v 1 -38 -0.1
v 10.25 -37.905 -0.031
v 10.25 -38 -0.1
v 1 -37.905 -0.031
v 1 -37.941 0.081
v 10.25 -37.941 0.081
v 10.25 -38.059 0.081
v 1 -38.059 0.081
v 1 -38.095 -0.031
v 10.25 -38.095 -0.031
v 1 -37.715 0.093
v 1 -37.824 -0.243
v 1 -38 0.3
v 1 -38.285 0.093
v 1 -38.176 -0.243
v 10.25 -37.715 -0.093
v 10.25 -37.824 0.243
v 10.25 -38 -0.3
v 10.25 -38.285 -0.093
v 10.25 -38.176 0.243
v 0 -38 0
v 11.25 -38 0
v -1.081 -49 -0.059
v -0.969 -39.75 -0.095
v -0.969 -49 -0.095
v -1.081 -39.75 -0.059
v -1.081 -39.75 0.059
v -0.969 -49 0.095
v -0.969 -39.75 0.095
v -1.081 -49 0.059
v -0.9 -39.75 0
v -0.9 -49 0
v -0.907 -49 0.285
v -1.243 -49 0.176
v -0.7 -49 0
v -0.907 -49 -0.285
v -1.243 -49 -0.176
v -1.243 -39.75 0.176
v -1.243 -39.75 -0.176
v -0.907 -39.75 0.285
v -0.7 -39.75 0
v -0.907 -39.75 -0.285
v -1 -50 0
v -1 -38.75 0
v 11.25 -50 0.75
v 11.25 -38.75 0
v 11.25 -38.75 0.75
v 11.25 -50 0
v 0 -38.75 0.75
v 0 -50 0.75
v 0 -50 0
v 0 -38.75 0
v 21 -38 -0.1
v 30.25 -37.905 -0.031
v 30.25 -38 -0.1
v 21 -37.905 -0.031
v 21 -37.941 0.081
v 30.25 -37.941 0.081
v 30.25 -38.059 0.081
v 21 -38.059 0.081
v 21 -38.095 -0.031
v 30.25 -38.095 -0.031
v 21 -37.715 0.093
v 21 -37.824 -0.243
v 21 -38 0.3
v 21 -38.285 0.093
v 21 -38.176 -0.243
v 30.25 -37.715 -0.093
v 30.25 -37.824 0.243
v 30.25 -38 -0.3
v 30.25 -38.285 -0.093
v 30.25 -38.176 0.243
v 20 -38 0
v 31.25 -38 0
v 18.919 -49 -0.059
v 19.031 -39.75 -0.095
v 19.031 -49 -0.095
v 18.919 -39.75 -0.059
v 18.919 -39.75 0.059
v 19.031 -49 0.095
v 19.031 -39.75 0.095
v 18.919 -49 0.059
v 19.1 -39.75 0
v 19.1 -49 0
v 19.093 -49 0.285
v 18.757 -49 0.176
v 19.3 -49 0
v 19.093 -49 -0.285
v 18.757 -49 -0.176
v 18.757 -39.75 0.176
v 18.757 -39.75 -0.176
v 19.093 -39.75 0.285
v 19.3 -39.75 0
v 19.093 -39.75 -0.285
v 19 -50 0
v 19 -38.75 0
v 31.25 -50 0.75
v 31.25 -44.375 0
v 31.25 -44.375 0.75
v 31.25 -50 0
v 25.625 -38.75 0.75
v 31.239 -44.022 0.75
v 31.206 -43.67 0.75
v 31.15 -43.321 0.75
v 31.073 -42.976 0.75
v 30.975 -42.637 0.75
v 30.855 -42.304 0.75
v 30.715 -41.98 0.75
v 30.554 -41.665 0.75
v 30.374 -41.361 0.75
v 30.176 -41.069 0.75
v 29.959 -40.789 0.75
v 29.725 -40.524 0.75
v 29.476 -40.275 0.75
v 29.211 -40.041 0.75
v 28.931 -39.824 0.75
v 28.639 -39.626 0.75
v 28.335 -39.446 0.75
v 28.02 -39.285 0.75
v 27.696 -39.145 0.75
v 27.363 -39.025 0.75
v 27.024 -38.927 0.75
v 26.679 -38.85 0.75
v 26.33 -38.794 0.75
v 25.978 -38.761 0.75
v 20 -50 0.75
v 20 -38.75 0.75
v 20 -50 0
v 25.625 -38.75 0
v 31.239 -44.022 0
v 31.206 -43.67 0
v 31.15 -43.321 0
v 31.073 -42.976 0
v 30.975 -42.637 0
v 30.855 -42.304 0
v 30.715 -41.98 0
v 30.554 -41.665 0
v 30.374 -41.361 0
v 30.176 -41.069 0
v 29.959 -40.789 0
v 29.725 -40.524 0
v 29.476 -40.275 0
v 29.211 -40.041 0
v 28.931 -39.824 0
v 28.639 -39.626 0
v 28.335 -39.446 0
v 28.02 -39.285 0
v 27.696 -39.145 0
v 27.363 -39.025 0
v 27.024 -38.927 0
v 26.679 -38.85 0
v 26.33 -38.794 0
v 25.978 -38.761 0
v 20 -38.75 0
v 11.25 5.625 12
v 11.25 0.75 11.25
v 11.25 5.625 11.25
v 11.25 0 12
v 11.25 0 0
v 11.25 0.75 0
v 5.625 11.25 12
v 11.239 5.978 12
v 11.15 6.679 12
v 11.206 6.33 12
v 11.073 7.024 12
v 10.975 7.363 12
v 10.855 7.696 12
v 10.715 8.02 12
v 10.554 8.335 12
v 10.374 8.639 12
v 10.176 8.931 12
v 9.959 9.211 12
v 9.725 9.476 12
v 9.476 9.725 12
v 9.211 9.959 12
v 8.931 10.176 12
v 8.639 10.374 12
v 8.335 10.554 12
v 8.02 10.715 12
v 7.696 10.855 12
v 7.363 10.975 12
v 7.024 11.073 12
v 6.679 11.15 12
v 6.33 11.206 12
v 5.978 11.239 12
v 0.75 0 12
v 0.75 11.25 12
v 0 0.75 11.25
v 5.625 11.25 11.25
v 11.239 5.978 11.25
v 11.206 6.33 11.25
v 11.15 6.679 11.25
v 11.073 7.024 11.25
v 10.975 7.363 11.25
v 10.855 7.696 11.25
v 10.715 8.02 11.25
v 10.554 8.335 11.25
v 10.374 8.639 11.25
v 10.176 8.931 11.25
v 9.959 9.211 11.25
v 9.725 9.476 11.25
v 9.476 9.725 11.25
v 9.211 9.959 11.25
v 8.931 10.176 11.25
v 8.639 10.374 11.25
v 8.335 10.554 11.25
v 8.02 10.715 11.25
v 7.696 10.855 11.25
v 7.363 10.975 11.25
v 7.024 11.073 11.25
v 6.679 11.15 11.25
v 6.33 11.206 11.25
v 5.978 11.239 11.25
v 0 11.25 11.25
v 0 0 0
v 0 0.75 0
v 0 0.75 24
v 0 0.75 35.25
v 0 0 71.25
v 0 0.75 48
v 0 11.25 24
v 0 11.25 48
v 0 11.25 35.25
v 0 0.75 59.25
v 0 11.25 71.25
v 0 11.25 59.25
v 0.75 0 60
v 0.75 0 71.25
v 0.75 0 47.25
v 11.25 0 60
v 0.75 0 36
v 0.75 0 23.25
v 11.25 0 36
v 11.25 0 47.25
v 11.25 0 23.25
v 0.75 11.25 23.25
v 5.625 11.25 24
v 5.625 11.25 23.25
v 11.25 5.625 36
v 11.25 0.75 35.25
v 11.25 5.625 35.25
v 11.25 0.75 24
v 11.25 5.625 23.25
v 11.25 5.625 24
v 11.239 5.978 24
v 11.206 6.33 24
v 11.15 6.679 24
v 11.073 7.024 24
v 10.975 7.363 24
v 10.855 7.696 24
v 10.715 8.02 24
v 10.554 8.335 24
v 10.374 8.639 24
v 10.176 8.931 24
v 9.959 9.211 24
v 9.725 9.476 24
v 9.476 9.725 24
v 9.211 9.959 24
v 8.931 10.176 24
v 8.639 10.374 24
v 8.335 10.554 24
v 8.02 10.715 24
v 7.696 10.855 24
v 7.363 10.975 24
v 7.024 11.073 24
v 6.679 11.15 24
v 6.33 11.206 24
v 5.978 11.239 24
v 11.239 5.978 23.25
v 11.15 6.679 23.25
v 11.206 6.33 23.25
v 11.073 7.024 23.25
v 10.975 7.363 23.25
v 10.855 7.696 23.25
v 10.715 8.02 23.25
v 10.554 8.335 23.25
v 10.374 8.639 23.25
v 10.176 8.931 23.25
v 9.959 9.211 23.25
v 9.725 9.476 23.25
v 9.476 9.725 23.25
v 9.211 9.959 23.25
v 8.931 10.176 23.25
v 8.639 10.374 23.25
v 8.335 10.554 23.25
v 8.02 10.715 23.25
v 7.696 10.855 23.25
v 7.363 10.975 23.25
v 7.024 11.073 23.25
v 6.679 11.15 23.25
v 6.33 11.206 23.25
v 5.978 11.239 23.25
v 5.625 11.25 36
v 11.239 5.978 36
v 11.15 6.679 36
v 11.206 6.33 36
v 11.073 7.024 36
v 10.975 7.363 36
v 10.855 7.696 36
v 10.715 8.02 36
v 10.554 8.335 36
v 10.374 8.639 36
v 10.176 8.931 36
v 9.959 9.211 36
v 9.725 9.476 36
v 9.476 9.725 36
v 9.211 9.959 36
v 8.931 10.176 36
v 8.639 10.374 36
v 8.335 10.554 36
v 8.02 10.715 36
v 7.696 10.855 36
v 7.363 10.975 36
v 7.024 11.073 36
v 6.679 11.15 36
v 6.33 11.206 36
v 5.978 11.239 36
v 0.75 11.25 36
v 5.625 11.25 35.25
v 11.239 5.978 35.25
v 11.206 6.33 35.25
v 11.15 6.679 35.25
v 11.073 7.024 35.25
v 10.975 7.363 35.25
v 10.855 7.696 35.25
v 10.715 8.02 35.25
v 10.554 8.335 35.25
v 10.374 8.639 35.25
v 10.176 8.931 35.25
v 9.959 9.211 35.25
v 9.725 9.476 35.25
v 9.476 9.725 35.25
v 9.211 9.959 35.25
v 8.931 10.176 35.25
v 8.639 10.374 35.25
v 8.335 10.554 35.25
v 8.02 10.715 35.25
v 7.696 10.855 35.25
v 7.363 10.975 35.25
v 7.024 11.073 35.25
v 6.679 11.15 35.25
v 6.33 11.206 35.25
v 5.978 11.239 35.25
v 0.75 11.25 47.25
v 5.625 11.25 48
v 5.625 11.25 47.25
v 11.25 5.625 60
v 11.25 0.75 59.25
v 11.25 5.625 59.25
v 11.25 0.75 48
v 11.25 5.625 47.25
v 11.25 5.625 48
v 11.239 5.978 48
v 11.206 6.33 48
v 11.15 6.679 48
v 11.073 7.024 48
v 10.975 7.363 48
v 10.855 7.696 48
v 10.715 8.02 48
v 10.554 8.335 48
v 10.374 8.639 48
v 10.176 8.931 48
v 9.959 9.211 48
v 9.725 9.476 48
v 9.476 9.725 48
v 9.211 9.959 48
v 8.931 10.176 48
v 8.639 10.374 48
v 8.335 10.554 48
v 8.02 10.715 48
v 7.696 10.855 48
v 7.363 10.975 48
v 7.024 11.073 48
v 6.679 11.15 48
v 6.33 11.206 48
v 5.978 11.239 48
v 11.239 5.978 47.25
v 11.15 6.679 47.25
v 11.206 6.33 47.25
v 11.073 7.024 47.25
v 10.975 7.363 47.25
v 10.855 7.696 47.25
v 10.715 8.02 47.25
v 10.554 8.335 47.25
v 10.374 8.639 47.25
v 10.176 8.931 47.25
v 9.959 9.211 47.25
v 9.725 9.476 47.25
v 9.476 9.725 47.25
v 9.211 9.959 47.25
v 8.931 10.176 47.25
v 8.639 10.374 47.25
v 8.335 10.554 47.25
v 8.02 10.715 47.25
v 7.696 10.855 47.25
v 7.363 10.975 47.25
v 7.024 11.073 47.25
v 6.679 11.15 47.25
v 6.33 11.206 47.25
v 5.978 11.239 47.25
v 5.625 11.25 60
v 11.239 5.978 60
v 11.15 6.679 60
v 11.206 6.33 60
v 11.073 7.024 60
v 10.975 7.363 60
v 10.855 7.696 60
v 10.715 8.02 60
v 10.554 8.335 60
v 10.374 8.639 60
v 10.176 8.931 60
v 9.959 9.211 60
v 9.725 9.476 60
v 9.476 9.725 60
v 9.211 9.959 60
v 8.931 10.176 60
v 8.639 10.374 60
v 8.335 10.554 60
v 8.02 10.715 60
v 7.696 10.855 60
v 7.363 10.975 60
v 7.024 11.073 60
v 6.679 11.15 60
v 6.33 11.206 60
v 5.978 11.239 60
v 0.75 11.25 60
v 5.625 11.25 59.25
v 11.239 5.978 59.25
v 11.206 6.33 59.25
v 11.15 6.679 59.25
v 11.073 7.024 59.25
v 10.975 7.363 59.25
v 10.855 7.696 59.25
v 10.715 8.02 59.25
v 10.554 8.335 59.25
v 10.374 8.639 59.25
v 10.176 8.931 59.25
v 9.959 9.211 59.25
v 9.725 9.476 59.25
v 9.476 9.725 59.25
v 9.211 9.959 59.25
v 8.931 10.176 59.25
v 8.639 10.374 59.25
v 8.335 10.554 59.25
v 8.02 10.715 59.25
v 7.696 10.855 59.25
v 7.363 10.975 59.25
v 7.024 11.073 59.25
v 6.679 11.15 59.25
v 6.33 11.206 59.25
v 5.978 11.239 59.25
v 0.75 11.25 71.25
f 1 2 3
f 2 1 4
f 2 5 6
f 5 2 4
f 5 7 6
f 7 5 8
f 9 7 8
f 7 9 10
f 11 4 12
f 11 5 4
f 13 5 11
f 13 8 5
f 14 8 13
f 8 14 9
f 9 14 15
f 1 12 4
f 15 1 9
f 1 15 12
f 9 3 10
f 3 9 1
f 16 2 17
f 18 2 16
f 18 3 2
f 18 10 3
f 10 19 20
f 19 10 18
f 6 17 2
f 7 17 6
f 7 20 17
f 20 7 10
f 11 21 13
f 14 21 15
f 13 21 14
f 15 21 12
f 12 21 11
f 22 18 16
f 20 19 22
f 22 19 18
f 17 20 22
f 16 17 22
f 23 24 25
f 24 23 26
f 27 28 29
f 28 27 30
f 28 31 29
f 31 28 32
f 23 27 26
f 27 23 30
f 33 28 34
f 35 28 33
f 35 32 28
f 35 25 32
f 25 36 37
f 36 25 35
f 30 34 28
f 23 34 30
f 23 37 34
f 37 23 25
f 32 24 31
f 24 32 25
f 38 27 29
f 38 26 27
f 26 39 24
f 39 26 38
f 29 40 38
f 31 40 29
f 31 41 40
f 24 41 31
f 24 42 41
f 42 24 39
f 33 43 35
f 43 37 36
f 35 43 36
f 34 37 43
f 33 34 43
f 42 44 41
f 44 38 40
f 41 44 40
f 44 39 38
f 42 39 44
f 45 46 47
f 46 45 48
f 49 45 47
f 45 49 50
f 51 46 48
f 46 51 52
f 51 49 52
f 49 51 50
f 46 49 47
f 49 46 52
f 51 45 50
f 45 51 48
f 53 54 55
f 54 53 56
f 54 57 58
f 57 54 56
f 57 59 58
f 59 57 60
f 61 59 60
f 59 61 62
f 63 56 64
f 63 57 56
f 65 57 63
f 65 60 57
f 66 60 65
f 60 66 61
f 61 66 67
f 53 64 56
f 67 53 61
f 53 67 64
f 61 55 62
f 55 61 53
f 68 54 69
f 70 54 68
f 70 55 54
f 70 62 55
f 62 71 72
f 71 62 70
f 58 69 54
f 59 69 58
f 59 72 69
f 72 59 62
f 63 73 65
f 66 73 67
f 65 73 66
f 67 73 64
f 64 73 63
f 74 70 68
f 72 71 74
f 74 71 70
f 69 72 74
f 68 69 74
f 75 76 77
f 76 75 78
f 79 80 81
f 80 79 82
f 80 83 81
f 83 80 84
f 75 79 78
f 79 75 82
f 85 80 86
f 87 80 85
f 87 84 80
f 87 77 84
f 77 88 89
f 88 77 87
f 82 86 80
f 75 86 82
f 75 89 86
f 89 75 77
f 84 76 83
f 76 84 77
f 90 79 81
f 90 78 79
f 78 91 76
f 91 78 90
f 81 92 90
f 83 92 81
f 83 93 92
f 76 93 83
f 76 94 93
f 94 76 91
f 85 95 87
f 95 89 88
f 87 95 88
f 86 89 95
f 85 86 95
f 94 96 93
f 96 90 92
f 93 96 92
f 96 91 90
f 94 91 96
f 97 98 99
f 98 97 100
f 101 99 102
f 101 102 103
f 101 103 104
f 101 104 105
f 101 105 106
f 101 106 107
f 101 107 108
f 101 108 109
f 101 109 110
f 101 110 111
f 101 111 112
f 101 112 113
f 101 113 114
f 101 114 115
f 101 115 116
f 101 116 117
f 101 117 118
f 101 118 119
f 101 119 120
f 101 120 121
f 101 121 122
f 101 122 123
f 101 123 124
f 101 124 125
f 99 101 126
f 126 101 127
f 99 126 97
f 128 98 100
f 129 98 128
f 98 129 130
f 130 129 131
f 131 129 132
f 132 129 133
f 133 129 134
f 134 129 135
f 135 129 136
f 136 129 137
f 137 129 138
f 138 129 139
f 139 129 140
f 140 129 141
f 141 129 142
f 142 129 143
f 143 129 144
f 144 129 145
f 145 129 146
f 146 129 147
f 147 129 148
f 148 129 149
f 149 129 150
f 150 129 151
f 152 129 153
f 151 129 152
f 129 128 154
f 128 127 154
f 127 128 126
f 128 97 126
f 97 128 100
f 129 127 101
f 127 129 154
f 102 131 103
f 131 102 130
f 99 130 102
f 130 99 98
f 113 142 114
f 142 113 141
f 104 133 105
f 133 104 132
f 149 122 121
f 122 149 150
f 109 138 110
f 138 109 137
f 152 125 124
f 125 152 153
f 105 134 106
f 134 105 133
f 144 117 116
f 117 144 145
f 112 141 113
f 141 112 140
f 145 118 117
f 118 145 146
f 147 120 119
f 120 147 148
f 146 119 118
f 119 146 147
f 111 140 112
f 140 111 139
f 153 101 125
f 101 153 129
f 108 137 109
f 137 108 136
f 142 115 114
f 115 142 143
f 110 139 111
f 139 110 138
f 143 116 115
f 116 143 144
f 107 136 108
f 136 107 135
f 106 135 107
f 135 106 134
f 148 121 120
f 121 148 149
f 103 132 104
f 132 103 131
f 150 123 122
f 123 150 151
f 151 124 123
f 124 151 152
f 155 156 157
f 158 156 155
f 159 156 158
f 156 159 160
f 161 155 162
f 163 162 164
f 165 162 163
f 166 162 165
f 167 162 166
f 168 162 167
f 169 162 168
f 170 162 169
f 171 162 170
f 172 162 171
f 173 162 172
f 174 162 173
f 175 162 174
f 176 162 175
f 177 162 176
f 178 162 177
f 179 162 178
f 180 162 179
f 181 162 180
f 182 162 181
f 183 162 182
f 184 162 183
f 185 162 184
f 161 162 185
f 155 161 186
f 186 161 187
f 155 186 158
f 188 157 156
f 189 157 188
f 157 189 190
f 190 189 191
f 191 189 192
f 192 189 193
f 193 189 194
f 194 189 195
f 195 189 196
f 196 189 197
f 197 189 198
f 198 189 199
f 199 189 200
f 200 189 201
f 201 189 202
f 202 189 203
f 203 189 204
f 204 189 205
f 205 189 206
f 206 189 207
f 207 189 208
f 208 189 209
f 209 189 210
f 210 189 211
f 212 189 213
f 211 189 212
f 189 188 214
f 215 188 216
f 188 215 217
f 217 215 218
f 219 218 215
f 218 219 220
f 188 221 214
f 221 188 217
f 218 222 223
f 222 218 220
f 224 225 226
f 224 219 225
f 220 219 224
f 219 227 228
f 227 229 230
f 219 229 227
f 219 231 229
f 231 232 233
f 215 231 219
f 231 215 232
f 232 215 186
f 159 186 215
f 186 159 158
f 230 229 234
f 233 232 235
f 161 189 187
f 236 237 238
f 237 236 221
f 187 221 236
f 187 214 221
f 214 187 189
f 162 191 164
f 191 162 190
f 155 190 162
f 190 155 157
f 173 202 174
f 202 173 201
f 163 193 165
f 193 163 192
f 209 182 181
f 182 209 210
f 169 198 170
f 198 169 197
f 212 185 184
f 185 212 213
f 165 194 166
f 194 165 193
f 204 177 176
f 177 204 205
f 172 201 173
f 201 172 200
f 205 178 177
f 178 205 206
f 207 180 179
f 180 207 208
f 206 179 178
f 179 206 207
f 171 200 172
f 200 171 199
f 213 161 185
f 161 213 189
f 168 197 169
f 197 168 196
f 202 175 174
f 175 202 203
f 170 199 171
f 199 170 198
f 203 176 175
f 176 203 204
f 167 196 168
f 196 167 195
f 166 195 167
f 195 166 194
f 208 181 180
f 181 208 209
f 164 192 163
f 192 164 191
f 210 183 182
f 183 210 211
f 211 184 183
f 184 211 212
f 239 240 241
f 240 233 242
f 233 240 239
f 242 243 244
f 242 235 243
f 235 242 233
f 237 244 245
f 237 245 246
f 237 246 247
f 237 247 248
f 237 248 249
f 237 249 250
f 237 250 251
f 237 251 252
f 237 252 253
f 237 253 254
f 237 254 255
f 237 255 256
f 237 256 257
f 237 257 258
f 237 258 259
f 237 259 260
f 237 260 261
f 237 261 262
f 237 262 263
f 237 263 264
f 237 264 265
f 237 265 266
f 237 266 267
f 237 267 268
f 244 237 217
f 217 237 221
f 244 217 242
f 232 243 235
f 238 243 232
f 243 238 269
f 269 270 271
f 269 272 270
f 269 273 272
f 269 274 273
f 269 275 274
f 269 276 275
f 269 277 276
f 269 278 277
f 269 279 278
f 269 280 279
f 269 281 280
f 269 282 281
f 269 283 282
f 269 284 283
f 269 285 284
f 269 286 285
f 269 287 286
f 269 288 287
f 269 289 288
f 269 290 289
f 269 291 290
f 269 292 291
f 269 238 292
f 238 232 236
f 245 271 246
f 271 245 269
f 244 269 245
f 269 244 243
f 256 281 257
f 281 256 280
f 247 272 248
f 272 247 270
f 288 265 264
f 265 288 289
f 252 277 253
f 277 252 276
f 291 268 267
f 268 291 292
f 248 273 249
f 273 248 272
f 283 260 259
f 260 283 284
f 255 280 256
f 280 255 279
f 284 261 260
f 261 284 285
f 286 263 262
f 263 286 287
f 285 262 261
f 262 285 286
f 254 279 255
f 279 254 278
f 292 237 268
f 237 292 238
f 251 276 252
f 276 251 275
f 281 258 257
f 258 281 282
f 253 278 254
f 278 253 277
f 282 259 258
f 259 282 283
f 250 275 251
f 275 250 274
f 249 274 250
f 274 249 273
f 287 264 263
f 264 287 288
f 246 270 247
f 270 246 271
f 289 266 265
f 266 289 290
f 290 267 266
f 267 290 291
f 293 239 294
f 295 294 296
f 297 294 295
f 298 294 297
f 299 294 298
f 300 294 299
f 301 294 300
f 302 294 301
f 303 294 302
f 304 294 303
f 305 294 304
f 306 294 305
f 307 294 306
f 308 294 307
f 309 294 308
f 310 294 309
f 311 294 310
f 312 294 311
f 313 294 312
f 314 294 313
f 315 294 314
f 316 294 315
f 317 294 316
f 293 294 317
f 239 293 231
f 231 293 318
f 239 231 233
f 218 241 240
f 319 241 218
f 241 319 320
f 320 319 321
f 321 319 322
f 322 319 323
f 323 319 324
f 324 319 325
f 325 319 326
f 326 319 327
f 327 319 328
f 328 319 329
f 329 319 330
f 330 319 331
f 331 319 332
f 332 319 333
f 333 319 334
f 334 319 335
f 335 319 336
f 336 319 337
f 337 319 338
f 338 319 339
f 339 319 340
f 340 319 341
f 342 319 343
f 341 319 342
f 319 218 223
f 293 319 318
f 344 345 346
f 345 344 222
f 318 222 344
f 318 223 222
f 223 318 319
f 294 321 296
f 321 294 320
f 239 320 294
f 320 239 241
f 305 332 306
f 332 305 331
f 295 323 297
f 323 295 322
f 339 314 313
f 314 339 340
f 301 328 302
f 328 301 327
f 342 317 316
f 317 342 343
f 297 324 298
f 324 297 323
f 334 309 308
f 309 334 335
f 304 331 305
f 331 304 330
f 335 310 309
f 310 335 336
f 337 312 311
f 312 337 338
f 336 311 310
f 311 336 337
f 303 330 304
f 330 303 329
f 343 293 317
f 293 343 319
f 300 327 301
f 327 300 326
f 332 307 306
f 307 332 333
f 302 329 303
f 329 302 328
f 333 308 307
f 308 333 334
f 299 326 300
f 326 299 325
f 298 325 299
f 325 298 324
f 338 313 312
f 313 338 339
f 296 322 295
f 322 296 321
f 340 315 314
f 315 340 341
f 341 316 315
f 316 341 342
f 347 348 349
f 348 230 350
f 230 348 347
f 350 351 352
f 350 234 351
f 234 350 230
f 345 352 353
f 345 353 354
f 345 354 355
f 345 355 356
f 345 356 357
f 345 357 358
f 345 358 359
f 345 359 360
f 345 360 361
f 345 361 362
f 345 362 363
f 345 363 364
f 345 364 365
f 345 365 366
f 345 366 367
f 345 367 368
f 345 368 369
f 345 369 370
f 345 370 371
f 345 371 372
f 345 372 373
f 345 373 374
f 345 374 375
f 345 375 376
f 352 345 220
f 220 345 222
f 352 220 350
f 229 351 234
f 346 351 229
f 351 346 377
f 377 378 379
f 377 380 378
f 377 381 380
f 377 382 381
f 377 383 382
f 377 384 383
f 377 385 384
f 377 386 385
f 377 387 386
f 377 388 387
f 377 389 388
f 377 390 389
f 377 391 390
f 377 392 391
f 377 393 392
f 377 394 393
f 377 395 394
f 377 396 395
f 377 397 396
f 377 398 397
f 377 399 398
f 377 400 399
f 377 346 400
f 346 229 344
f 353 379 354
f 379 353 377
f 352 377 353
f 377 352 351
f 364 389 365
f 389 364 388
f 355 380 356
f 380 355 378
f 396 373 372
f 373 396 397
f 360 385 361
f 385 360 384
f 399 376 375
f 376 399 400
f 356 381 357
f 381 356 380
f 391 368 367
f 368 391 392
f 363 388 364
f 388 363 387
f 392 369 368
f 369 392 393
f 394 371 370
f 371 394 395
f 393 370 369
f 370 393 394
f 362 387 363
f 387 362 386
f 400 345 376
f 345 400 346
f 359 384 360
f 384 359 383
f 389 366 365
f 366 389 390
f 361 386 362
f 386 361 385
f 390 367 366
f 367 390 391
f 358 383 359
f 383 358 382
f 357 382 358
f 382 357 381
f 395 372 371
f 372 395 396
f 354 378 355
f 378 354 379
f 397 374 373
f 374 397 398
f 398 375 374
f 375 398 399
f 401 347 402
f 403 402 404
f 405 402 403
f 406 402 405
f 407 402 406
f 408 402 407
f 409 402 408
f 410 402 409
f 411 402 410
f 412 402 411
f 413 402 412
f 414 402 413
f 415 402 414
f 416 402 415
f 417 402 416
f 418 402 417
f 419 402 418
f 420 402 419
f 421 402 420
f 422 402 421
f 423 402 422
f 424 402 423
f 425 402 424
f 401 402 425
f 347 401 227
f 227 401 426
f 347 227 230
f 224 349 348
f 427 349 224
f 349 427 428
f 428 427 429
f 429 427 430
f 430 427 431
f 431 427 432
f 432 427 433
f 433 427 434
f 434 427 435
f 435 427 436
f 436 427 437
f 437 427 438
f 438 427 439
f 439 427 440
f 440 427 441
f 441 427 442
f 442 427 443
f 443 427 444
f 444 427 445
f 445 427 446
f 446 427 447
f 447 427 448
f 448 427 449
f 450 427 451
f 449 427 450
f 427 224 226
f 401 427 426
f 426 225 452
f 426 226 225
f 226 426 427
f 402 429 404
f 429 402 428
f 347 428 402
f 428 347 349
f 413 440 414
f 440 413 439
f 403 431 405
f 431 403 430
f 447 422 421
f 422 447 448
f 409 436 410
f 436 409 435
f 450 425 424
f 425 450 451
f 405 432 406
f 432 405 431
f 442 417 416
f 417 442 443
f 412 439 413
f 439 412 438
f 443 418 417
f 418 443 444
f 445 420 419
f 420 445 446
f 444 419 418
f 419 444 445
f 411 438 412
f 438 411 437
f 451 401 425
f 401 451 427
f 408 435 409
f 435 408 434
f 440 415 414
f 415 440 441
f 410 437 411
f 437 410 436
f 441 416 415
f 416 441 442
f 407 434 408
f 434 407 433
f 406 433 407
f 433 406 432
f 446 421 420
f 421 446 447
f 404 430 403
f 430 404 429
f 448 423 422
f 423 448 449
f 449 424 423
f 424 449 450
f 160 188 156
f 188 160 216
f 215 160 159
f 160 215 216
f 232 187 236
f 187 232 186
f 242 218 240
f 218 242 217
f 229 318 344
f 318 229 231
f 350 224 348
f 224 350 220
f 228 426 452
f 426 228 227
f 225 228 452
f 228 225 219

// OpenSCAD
// file: ../lib/common.scad
//--------------------------------------------------------------------------------------------------
// Module Prism
//--------------------------------------------------------------------------------------------------
module prism(z, y, x)
{
    rotate([0, 90, 0])
    {
        polyhedron(
                points=[[0,0,0], [x,0,0], [x,y,0], [0,y,0], [0,y,z], [x,y,z]],
                faces=[[0,1,2,3],[5,4,3,2],[0,4,5,1],[0,3,4],[5,2,1]]);
    }
}

//--------------------------------------------------------------------------------------------------
// Module Side panel
//--------------------------------------------------------------------------------------------------
module rect_cut(x, y, z, dx, dy)
{
    // Top panel
    translate([0, dy, 0])
    {
        cube([x, y - dy, z]);
    };

    // Left bottom panel
    translate([0, 0, 0])
    {
        cube([dx, dy, z]);
    };

    // Triangle
    translate([dx, 0, 0])
    {
        rotate([0, 0, 0])
        {
            prism(x - dx, dy, -z);
        }
    };
}

//--------------------------------------------------------------------------------------------------
// X dimensional arrow
//--------------------------------------------------------------------------------------------------
module arrow_x(l)
{
    line_w = 0.1;
    arrow_w = 1;
    arrow_h = 0.3;

    // Line
    translate([l / 2, 0, 0])
    {
        rotate([0, 90, 0])
        {
            color([0.4, 0.4, 0.4])
            cylinder(l - arrow_w * 2, line_w, line_w, true);
        }
    }

    // Left arrow
    translate([arrow_w, 0, 0])
    {
        rotate([0, 270, 0])
        {
            color([0.4, 0.4, 0.4])
            cylinder(arrow_w, arrow_h, 0, false);
        }
    }

    // Right arrow
    translate([l - arrow_w, 0, 0])
    {
        rotate([0, 90, 0])
        {
            color([0.4, 0.4, 0.4])
            cylinder(arrow_w, arrow_h, 0, false);
        }
    }

    // Text
    translate([l/3, 0.5, 0])
    {
        color([0.4, 0.4, 0.4])
        text(str(l), size=1);
    }
}

//--------------------------------------------------------------------------------------------------
// Y dimensional arrow
//--------------------------------------------------------------------------------------------------
module arrow_y(l)
{
    line_w = 0.1;
    arrow_w = 1;
    arrow_h = 0.3;

    // Line
    translate([0, l / 2, 0])
    {
        rotate([90, 0, 00])
        {
            color([0.4, 0.4, 0.4])
            cylinder(l - arrow_w * 2, line_w, line_w, true);
        }
    }

    // Left arrow
    translate([0 ,arrow_w, 0])
    {
        rotate([90, 0, 0])
        {
            color([0.4, 0.4, 0.4])
            cylinder(arrow_w, arrow_h, 0, false);
        }
    }

    // Right arrow
    translate([0, l - arrow_w, 0])
    {
        rotate([270, 0, 0])
        {
            color([0.4, 0.4, 0.4])
            cylinder(arrow_w, arrow_h, 0, false);
        }
    }

    // Text
    translate([-0.5, l/3, 0])
    {
        rotate([0 ,0, 90])
        {
            color([0.4, 0.4, 0.4])
            text(str(l), size=1);
        }
    }
}

//--------------------------------------------------------------------------------------------------
// Z dimensional arrow
//--------------------------------------------------------------------------------------------------
module arrow_z(l)
{
    line_w = 0.11;
    arrow_w = 1;
    arrow_h = 0.3;

    // Line
    translate([0, 0, l / 2])
    {
        rotate([0, 0, 0])
        {
            color([0.4, 0.4, 0.4])
            cylinder(l - arrow_w * 2, line_w, line_w, true);
        }
    }

    // Left arrow
    translate([0, 0, arrow_w])
    {
        rotate([0, 180, 0])
        {
            color([0.4, 0.4, 0.4])
            cylinder(arrow_w, arrow_h, 0, false);
        }
    }

    // Right arrow
    translate([0, 0, l - arrow_w])
    {
        rotate([0, 0, 0])
        {
            color([0.4, 0.4, 0.4])
            cylinder(arrow_w, arrow_h, 0, false);
        }
    }

    // Text
    translate([0.5, 0, l/3])
    {
        rotate([90 ,0, 90])
        {
            color([0.4, 0.4, 0.4])
            text(str(l), size=1);
        }
    }
}

//--------------------------------------------------------------------------------------------------
// parallelogram
//--------------------------------------------------------------------------------------------------
module parallelogram(x = 12, y = 12, z = 1, xd = 0)
{
    points = [
        [0, 0, 0 ],        //0
        [x, 0, 0 ],        //1
        [x + xd, y, 0],    //2
        [xd, y, 0 ],       //3
        [0, 0, z ],        //4
        [x, 0, z ],        //5
        [x + xd, y, z ],   //6
        [xd, y, z ]];      //7

    faces = [
        [0,1,2,3],         // bottom
        [4,5,1,0],         // front
        [7,6,5,4],         // top
        [5,6,2,1],         // right
        [6,7,3,2],         // back
        [7,4,0,3]];        // left

    polyhedron(points, faces);
}

//--------------------------------------------------------------------------------------------------
// common board
//--------------------------------------------------------------------------------------------------
module board(w, h, d, r, g, b)
{
    color([r, g, b])
    cube([w, h, d]);
}

//--------------------------------------------------------------------------------------------------
// board dimension
//--------------------------------------------------------------------------------------------------
module dimension(w, h, d, r, g, b, part_x, part_y)
{
    translate([part_x, -part_y, 0])
    {
        rotate([-90, 0, 0])
        {
            board(w, h, d, r, g, b);
        }
            
        translate([0, -2, 0])
        {
            color([0, 0, 0])
            arrow_x(w);
        };

        translate([-1, 0, 0])
        {
            color([0, 0, 0])
            arrow_y(d);
        };
    }
}
// main file
include <../lib/common.scad>

/*
11.25 X 11 = 123.75 (10.3125 ft)
Poplar: 2 X 6ft = $34.5 X 2 = $69
*/

//--------------------------------------------------------------------------------------------------
module top_vert()
{
    color([0, 0, 1])
    cube([11.25, 11.25, 0.75]);
}

//--------------------------------------------------------------------------------------------------
module top_hor()
{
    color([0, 1, 1])
    cube([11.25, 5.625, 0.75]);

    translate([0, 5.625, 0])
    {
        color([0, 1, 1])
        cube([5.625, 5.625, 0.75]);
    }

    translate([5.625, 5.625, 0])
    {
        color([0, 1, 1])
        cylinder(0.75, 5.625, 5.625, false, $fn=100);
    }
}

//--------------------------------------------------------------------------------------------------
// Draw Parts
//--------------------------------------------------------------------------------------------------
translate([0, -50, 0])
{
    //----------------------------------------------------------------------------------------------
    // top_vert
    //----------------------------------------------------------------------------------------------
    translate([0, 0, 0])
    {
        top_vert();

        translate([0, 12, 0])
        {
            arrow_x(11.25);
        };

        translate([-1, 0, 0])
        {
            arrow_y(11.25);
        };
    }

    //----------------------------------------------------------------------------------------------
    // top_hor
    //----------------------------------------------------------------------------------------------
    translate([20, 0, 0])
    {
        top_hor();

        translate([0, 12, 0])
        {
            arrow_x(11.25);
        };

        translate([-1, 0, 0])
        {
            arrow_y(11.25);
        };
    }
};


//--------------------------------------------------------------------------------------------------
// Render
//--------------------------------------------------------------------------------------------------
translate([0, 0, 0])
{
    translate([0 , 0, 11.25])
    {
        rotate([270, 0, 0])
        {
            top_vert();
        }
    }

    translate([0 , 0, 11.25])
    {
        rotate([0, 0, 0])
        {
            top_hor();
        }
    }

    translate([0 , 0, 23.25])
    {
        rotate([0, 90, 0])
        {
            top_vert();
        }
    }

    translate([0 , 0, 23.25])
    {
        rotate([0, 0, 0])
        {
            top_hor();
        }
    }

    translate([0 , 0, 35.25])
    {
        rotate([270, 0, 0])
        {
            top_vert();
        }
    }

    translate([0 , 0, 35.25])
    {
        rotate([0, 0, 0])
        {
            top_hor();
        }
    }

    translate([0 , 0, 47.25])
    {
        rotate([0, 90, 0])
        {
            top_vert();
        }
    }

    translate([0 , 0, 47.25])
    {
        rotate([0, 0, 0])
        {
            top_hor();
        }
    }

    translate([0 , 0, 59.25])
    {
        rotate([270, 0, 0])
        {
            top_vert();
        }
    }

    translate([0 , 0, 59.25])
    {
        rotate([0, 0, 0])
        {
            top_hor();
        }
    }

    translate([0 , 0, 59.25 + 12])
    {
        rotate([0, 90, 0])
        {
            top_vert();
        }
    }
}
